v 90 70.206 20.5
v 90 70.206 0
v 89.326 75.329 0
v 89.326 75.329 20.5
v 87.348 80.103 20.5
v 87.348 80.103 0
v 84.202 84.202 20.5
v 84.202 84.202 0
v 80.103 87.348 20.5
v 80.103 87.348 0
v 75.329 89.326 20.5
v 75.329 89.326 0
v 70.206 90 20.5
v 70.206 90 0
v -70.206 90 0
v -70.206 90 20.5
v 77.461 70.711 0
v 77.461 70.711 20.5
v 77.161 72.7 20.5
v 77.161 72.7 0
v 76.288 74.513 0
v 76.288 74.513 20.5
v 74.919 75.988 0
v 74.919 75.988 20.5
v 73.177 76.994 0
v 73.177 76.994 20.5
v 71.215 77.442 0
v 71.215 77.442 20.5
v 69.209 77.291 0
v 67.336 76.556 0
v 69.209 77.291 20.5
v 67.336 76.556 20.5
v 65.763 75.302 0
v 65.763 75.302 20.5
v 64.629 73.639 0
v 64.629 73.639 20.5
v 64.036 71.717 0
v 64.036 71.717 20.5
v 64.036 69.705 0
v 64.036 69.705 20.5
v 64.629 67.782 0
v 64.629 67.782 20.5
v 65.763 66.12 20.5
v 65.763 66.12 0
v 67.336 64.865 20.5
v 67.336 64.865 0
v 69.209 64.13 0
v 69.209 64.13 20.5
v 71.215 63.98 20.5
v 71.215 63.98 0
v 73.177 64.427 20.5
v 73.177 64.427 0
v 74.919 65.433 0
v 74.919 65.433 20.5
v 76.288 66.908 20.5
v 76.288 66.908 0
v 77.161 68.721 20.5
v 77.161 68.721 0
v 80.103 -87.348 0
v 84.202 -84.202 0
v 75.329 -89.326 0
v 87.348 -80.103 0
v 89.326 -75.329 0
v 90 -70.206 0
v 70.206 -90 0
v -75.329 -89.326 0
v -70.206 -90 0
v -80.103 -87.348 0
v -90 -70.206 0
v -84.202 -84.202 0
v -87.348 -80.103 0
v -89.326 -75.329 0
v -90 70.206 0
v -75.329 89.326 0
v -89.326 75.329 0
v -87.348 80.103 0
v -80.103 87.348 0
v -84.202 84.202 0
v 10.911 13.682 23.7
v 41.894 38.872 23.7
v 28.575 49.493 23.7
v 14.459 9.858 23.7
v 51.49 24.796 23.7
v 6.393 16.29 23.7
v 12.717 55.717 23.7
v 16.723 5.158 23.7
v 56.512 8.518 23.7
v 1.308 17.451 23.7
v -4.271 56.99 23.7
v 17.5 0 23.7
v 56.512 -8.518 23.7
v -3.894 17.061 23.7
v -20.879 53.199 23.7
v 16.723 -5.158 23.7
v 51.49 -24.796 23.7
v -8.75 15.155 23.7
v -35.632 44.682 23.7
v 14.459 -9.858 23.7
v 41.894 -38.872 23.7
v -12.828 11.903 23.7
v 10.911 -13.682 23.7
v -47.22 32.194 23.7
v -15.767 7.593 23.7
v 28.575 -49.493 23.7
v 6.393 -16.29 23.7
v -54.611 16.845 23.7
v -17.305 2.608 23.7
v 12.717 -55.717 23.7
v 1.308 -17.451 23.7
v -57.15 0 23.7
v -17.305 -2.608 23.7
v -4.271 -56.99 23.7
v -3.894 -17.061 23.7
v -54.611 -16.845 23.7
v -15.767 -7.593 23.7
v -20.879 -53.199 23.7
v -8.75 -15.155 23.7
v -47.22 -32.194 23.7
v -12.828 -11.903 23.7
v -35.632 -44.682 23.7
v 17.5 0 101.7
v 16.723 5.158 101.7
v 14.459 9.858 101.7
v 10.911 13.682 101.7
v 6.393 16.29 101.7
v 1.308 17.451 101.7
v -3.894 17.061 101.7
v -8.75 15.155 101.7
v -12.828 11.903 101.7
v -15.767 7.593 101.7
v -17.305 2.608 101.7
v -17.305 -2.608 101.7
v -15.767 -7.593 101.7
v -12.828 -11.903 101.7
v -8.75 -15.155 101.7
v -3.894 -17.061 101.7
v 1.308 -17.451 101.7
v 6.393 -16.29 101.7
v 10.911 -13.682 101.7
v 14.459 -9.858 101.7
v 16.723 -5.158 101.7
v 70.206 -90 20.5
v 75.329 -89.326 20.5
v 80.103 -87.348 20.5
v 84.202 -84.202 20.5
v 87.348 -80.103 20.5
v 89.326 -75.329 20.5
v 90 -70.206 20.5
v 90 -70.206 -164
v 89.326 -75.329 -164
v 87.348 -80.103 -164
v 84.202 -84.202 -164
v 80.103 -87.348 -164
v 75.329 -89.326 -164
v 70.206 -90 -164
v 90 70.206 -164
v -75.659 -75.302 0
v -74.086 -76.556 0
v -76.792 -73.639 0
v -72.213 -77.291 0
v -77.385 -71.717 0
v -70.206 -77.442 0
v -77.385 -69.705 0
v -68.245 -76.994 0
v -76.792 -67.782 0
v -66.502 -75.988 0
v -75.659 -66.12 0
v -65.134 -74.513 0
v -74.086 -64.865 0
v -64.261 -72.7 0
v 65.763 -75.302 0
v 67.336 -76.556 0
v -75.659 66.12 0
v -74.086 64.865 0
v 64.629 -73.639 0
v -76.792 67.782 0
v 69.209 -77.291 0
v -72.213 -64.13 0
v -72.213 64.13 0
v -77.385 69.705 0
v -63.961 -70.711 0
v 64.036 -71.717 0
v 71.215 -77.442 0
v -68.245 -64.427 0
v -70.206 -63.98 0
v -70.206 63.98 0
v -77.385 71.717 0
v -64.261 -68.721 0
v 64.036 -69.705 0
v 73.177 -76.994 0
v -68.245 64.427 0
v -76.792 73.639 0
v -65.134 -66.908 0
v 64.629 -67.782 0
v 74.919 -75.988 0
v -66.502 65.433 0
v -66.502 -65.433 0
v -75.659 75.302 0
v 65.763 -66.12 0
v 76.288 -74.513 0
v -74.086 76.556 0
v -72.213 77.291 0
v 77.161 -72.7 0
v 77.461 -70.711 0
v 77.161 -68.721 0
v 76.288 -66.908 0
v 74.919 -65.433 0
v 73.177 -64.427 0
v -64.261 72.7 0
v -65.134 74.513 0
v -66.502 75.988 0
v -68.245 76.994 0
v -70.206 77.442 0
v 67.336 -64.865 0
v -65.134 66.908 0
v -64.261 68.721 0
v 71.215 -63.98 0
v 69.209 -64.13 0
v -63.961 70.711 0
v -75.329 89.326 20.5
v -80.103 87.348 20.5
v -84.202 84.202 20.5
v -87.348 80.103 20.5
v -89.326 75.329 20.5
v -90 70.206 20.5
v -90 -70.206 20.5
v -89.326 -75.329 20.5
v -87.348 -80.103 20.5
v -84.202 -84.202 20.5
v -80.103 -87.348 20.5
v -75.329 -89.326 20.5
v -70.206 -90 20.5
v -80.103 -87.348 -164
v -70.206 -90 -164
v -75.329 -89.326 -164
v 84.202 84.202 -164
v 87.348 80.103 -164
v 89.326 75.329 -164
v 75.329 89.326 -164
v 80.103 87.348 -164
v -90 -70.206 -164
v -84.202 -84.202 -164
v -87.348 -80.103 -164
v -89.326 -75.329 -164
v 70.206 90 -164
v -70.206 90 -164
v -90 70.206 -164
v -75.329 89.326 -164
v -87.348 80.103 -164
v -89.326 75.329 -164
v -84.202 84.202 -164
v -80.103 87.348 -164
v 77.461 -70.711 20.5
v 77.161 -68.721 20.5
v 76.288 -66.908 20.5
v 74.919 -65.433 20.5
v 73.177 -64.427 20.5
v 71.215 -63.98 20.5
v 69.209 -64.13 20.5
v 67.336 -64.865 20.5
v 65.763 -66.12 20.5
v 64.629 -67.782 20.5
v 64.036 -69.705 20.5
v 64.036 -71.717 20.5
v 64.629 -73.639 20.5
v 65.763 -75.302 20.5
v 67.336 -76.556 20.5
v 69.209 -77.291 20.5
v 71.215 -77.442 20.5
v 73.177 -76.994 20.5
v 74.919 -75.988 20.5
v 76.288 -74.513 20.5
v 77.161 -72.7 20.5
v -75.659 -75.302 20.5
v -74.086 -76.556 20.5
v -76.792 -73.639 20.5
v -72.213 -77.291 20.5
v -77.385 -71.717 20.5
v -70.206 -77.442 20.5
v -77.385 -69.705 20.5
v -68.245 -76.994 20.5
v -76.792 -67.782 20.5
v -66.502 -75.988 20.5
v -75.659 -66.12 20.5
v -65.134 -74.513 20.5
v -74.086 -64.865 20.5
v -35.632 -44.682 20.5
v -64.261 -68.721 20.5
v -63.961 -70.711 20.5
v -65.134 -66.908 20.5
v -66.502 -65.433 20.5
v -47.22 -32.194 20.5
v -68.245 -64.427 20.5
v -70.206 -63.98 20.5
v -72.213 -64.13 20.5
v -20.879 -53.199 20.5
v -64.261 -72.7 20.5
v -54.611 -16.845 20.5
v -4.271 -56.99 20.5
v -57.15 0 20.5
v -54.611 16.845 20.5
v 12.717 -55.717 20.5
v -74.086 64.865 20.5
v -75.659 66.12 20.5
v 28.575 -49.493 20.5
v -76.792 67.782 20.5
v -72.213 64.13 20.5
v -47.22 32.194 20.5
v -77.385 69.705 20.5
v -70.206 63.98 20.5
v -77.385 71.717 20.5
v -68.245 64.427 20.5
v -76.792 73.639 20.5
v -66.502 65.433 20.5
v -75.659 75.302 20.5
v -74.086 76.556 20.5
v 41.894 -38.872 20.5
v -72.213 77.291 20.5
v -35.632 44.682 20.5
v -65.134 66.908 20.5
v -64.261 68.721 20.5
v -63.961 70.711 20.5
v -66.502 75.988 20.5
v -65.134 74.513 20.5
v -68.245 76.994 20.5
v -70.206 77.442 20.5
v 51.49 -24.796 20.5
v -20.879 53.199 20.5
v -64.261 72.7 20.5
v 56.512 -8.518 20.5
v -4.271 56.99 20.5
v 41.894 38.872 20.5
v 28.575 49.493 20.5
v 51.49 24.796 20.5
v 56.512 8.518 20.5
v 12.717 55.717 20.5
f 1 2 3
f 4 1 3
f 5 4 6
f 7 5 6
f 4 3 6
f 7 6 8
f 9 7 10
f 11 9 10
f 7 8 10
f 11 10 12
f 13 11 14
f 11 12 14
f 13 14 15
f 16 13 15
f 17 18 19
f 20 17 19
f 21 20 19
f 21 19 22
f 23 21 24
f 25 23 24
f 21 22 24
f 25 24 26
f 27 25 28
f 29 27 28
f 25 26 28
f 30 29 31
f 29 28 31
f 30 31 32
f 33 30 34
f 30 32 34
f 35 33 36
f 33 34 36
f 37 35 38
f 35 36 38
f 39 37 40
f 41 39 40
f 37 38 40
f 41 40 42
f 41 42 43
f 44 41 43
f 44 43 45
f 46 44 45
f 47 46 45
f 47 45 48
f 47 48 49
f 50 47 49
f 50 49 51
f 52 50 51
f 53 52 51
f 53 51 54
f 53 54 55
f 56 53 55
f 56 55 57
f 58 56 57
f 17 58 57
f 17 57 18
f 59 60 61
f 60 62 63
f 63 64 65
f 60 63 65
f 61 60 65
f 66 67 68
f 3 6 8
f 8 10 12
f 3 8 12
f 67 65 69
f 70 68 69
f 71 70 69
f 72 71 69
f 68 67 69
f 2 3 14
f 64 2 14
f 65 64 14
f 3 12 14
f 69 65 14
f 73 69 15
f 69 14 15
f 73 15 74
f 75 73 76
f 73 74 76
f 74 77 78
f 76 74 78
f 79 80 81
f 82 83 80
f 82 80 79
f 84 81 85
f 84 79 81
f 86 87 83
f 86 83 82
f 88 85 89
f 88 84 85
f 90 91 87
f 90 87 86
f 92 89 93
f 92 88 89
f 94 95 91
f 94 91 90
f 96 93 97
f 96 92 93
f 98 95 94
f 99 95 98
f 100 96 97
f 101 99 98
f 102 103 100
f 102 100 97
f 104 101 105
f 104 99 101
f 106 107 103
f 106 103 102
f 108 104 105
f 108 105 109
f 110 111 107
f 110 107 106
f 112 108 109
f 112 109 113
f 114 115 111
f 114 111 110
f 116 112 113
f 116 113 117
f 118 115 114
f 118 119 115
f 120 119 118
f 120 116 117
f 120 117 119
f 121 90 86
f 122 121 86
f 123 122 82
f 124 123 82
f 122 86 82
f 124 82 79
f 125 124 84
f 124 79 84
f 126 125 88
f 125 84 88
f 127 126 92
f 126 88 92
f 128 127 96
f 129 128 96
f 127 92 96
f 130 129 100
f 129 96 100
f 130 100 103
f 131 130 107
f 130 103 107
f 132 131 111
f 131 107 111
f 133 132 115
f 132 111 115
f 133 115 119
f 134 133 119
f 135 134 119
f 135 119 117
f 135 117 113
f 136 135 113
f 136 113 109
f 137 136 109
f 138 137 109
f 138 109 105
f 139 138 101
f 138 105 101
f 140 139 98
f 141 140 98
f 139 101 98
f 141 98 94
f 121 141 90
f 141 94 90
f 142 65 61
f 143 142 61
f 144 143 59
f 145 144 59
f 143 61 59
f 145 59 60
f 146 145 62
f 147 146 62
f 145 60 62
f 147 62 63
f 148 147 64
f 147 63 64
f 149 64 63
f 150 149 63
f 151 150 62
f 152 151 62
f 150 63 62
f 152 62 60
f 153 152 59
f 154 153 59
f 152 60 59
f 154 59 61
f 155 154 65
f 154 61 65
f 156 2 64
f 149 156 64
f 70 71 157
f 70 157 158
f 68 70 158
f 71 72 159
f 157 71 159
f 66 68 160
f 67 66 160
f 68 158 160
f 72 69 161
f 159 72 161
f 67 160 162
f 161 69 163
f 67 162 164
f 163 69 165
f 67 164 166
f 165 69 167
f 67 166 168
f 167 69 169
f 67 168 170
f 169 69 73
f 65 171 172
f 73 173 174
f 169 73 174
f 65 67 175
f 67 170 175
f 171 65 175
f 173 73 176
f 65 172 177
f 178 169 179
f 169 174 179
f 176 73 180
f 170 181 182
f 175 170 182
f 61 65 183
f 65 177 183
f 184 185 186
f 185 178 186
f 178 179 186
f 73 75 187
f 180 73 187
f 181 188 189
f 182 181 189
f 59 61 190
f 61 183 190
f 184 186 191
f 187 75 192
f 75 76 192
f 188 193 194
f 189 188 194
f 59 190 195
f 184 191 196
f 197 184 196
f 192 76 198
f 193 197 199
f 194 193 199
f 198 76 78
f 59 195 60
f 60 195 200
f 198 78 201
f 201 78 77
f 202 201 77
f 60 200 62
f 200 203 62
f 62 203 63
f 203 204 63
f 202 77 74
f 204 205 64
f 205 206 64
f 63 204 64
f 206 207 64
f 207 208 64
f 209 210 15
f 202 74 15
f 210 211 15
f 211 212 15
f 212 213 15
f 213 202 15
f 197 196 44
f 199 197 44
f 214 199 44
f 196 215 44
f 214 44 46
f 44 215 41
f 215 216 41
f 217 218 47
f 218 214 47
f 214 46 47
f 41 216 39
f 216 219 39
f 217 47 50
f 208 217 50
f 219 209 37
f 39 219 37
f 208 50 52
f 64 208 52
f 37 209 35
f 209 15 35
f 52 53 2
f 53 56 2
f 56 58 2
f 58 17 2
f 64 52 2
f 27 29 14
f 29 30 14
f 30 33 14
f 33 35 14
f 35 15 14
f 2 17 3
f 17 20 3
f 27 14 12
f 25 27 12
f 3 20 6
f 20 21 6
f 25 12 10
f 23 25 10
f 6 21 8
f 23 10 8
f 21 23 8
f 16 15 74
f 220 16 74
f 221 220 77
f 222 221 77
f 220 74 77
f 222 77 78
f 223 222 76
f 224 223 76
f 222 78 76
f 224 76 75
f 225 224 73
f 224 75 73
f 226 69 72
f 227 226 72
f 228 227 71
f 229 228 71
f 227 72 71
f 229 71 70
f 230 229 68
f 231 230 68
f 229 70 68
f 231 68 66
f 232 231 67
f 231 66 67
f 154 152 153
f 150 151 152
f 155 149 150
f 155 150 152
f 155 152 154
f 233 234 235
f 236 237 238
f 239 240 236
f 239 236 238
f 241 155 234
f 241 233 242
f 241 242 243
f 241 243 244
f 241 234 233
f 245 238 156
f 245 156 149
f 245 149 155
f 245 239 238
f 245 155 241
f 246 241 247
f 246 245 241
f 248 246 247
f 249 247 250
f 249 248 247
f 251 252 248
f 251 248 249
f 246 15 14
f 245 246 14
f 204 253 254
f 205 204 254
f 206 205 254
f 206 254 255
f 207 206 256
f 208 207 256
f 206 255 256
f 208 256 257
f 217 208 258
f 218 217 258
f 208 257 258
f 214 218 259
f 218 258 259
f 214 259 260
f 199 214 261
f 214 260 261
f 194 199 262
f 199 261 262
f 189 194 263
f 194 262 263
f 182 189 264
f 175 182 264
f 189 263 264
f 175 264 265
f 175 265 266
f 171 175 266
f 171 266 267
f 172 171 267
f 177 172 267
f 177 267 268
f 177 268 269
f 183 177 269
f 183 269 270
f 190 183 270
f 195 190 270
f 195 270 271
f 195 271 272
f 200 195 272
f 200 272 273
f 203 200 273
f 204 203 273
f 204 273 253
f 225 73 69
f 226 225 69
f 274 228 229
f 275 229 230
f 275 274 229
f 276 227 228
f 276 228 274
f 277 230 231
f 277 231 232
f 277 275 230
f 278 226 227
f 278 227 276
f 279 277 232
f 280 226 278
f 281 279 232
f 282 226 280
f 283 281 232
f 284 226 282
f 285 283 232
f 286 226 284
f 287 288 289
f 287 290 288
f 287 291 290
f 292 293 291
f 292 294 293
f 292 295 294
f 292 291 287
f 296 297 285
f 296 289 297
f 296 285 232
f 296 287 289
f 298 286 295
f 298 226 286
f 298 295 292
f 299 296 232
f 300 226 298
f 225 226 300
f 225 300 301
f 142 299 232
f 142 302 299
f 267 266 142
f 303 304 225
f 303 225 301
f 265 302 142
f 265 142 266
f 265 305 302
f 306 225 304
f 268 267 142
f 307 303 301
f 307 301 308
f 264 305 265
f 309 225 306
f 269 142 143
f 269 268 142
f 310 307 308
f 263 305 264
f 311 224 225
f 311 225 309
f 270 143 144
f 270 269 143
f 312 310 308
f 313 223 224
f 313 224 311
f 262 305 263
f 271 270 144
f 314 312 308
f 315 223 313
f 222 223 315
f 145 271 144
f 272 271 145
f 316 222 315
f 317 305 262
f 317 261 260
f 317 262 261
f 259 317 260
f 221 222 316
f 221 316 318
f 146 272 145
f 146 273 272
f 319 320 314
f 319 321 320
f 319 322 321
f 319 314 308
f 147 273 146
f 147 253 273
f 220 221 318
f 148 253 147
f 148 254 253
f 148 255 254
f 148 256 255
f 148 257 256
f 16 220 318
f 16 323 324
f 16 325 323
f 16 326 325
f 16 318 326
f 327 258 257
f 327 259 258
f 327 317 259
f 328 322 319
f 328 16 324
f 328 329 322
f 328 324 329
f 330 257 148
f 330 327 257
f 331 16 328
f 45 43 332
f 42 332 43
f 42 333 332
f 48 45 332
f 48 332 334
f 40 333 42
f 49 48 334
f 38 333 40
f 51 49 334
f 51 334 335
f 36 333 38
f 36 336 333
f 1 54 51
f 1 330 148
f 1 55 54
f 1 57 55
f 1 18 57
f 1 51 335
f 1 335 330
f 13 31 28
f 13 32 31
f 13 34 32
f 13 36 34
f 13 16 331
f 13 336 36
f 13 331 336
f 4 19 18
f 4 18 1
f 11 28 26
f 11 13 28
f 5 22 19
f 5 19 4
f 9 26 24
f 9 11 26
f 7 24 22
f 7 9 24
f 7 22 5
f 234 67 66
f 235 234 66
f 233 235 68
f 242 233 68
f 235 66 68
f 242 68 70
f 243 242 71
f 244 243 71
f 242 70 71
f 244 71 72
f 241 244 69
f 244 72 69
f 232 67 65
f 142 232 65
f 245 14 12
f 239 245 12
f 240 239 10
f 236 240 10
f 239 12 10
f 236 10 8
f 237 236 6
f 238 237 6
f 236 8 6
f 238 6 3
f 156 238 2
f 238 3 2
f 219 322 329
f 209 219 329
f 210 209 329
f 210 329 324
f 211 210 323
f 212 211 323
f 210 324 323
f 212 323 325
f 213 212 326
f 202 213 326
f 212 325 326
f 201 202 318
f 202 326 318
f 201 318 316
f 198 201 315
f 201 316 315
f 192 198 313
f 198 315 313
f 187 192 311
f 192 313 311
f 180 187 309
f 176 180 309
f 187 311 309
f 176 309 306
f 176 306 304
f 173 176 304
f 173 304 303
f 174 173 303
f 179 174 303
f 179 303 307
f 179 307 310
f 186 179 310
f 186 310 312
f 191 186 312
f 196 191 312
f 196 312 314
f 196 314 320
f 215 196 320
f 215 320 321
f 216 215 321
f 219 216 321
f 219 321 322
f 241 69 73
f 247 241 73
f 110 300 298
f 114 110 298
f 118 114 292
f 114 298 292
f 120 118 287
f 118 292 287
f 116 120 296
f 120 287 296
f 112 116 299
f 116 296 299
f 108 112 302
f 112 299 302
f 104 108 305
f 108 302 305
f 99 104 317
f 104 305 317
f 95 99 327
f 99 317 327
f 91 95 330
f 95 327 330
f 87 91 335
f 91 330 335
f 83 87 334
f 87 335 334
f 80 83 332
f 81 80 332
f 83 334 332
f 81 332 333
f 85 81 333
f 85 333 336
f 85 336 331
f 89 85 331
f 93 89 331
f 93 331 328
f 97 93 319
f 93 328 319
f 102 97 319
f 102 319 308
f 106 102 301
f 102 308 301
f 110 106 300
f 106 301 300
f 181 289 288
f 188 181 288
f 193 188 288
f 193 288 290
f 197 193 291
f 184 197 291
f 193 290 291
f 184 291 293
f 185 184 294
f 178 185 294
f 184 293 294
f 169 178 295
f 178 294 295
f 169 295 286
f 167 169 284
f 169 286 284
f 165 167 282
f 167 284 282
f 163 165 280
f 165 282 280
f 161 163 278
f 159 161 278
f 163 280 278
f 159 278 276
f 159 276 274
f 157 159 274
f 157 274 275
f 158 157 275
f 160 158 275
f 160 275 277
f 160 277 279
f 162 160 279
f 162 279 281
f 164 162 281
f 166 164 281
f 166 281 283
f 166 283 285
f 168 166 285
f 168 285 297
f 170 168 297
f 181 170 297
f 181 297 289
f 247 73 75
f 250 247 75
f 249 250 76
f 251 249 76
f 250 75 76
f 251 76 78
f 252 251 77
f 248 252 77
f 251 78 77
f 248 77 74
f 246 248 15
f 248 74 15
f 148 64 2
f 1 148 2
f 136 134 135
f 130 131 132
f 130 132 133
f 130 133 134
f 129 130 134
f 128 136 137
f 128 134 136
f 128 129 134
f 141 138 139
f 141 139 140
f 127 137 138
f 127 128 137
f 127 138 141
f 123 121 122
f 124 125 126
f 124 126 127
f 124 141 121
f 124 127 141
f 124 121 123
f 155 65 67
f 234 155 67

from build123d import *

# Parameters (mm, degrees)
EXTRUDE_1_DEPTH     = 20.5
CUT_EXTRUDE_1_REACH = 130.92
SKETCH_2_R          = 6.75
EXTRUDE_2_DEPTH     = 164
SKETCH_4_R          = 57.15
EXTRUDE_3_DEPTH     = 3.2
SKETCH_5_R          = 17.5
EXTRUDE_4_DEPTH     = 78


with BuildPart() as part:
    # 草图1 → 凸台-拉伸1 (new body)
    with BuildSketch(Plane.XY):
        with BuildLine():
            Line((-70.206004001, -90), (70.206004001, -90))
            ThreePointArc((70.206004001, -90), (84.202472799, -84.202472799), (90, -70.206004001))
            Line((90, -70.206004001), (90, 70.206004001))
            ThreePointArc((90, 70.206004001), (84.202472799, 84.202472799), (70.206004001, 90))
            Line((70.206004001, 90), (-70.206004001, 90))
            ThreePointArc((-70.206004001, 90), (-84.202472799, 84.202472799), (-90, 70.206004001))
            Line((-90, 70.206004001), (-90, -70.206004001))
            ThreePointArc((-90, -70.206004001), (-84.202472799, -84.202472799), (-70.206004001, -90))
        make_face()
    extrude(amount=EXTRUDE_1_DEPTH)

    # 草图2 → 切除-拉伸1 (cut, up to next)
    with BuildSketch(Plane.XY.offset(20.5), mode=Mode.PRIVATE) as cut_extrude_1_sk1:
        with Locations((-70.7107, 70.7107)):
            Circle(SKETCH_2_R)
    cut_extrude_1_tool1 = extrude(cut_extrude_1_sk1.sketch, amount=-CUT_EXTRUDE_1_REACH, mode=Mode.PRIVATE) & part.part
    # 草图2 → 切除-拉伸1 (cut, up to next)
    with BuildSketch(Plane.XY.offset(20.5), mode=Mode.PRIVATE) as cut_extrude_1_sk2:
        with Locations((70.7107, 70.7107)):
            Circle(SKETCH_2_R)
    cut_extrude_1_tool2 = extrude(cut_extrude_1_sk2.sketch, amount=-CUT_EXTRUDE_1_REACH, mode=Mode.PRIVATE) & part.part
    # 草图2 → 切除-拉伸1 (cut, up to next)
    with BuildSketch(Plane.XY.offset(20.5), mode=Mode.PRIVATE) as cut_extrude_1_sk3:
        with Locations((70.7107, -70.7107)):
            Circle(SKETCH_2_R)
    cut_extrude_1_tool3 = extrude(cut_extrude_1_sk3.sketch, amount=-CUT_EXTRUDE_1_REACH, mode=Mode.PRIVATE) & part.part
    # 草图2 → 切除-拉伸1 (cut, up to next)
    with BuildSketch(Plane.XY.offset(20.5), mode=Mode.PRIVATE) as cut_extrude_1_sk4:
        with Locations((-70.7107, -70.7107)):
            Circle(SKETCH_2_R)
    cut_extrude_1_tool4 = extrude(cut_extrude_1_sk4.sketch, amount=-CUT_EXTRUDE_1_REACH, mode=Mode.PRIVATE) & part.part
    add(cut_extrude_1_tool1.solids().sort_by_distance((-70.7107, 70.7107, 20.5))[0], mode=Mode.SUBTRACT)
    add(cut_extrude_1_tool2.solids().sort_by_distance((70.7107, 70.7107, 20.5))[0], mode=Mode.SUBTRACT)
    add(cut_extrude_1_tool3.solids().sort_by_distance((70.7107, -70.7107, 20.5))[0], mode=Mode.SUBTRACT)
    add(cut_extrude_1_tool4.solids().sort_by_distance((-70.7107, -70.7107, 20.5))[0], mode=Mode.SUBTRACT)

    # 草图4 → 凸台-拉伸3 (add)
    with BuildSketch(Plane.XY.offset(20.5)):
        with Locations(Location((0, 0, 0), (0, 0, 180))):
            Circle(SKETCH_4_R)
    extrude(amount=EXTRUDE_3_DEPTH)

    # 草图5 → 凸台-拉伸4 (add)
    with BuildSketch(Plane.XY.offset(23.7)):
        Circle(SKETCH_5_R)
    extrude(amount=EXTRUDE_4_DEPTH)


with BuildPart() as body_2:
    # 草图3 → 凸台-拉伸2 (new body)
    with BuildSketch(Plane(origin=(0, 0, 0), x_dir=(-1, 0, 0), z_dir=(0, 0, -1))):
        with BuildLine():
            Line((-70.206004001, -90), (70.206004001, -90))
            ThreePointArc((70.206004001, -90), (84.202472799, -84.202472799), (90, -70.206004001))
            Line((90, -70.206004001), (90, 70.206004001))
            ThreePointArc((90, 70.206004001), (84.202472799, 84.202472799), (70.206004001, 90))
            Line((70.206004001, 90), (-70.206004001, 90))
            ThreePointArc((-70.206004001, 90), (-84.202472799, 84.202472799), (-90, 70.206004001))
            Line((-90, 70.206004001), (-90, -70.206004001))
            ThreePointArc((-90, -70.206004001), (-84.202472799, -84.202472799), (-70.206004001, -90))
        make_face()
    extrude(amount=EXTRUDE_2_DEPTH)


solid = Compound([part.part, body_2.part])
